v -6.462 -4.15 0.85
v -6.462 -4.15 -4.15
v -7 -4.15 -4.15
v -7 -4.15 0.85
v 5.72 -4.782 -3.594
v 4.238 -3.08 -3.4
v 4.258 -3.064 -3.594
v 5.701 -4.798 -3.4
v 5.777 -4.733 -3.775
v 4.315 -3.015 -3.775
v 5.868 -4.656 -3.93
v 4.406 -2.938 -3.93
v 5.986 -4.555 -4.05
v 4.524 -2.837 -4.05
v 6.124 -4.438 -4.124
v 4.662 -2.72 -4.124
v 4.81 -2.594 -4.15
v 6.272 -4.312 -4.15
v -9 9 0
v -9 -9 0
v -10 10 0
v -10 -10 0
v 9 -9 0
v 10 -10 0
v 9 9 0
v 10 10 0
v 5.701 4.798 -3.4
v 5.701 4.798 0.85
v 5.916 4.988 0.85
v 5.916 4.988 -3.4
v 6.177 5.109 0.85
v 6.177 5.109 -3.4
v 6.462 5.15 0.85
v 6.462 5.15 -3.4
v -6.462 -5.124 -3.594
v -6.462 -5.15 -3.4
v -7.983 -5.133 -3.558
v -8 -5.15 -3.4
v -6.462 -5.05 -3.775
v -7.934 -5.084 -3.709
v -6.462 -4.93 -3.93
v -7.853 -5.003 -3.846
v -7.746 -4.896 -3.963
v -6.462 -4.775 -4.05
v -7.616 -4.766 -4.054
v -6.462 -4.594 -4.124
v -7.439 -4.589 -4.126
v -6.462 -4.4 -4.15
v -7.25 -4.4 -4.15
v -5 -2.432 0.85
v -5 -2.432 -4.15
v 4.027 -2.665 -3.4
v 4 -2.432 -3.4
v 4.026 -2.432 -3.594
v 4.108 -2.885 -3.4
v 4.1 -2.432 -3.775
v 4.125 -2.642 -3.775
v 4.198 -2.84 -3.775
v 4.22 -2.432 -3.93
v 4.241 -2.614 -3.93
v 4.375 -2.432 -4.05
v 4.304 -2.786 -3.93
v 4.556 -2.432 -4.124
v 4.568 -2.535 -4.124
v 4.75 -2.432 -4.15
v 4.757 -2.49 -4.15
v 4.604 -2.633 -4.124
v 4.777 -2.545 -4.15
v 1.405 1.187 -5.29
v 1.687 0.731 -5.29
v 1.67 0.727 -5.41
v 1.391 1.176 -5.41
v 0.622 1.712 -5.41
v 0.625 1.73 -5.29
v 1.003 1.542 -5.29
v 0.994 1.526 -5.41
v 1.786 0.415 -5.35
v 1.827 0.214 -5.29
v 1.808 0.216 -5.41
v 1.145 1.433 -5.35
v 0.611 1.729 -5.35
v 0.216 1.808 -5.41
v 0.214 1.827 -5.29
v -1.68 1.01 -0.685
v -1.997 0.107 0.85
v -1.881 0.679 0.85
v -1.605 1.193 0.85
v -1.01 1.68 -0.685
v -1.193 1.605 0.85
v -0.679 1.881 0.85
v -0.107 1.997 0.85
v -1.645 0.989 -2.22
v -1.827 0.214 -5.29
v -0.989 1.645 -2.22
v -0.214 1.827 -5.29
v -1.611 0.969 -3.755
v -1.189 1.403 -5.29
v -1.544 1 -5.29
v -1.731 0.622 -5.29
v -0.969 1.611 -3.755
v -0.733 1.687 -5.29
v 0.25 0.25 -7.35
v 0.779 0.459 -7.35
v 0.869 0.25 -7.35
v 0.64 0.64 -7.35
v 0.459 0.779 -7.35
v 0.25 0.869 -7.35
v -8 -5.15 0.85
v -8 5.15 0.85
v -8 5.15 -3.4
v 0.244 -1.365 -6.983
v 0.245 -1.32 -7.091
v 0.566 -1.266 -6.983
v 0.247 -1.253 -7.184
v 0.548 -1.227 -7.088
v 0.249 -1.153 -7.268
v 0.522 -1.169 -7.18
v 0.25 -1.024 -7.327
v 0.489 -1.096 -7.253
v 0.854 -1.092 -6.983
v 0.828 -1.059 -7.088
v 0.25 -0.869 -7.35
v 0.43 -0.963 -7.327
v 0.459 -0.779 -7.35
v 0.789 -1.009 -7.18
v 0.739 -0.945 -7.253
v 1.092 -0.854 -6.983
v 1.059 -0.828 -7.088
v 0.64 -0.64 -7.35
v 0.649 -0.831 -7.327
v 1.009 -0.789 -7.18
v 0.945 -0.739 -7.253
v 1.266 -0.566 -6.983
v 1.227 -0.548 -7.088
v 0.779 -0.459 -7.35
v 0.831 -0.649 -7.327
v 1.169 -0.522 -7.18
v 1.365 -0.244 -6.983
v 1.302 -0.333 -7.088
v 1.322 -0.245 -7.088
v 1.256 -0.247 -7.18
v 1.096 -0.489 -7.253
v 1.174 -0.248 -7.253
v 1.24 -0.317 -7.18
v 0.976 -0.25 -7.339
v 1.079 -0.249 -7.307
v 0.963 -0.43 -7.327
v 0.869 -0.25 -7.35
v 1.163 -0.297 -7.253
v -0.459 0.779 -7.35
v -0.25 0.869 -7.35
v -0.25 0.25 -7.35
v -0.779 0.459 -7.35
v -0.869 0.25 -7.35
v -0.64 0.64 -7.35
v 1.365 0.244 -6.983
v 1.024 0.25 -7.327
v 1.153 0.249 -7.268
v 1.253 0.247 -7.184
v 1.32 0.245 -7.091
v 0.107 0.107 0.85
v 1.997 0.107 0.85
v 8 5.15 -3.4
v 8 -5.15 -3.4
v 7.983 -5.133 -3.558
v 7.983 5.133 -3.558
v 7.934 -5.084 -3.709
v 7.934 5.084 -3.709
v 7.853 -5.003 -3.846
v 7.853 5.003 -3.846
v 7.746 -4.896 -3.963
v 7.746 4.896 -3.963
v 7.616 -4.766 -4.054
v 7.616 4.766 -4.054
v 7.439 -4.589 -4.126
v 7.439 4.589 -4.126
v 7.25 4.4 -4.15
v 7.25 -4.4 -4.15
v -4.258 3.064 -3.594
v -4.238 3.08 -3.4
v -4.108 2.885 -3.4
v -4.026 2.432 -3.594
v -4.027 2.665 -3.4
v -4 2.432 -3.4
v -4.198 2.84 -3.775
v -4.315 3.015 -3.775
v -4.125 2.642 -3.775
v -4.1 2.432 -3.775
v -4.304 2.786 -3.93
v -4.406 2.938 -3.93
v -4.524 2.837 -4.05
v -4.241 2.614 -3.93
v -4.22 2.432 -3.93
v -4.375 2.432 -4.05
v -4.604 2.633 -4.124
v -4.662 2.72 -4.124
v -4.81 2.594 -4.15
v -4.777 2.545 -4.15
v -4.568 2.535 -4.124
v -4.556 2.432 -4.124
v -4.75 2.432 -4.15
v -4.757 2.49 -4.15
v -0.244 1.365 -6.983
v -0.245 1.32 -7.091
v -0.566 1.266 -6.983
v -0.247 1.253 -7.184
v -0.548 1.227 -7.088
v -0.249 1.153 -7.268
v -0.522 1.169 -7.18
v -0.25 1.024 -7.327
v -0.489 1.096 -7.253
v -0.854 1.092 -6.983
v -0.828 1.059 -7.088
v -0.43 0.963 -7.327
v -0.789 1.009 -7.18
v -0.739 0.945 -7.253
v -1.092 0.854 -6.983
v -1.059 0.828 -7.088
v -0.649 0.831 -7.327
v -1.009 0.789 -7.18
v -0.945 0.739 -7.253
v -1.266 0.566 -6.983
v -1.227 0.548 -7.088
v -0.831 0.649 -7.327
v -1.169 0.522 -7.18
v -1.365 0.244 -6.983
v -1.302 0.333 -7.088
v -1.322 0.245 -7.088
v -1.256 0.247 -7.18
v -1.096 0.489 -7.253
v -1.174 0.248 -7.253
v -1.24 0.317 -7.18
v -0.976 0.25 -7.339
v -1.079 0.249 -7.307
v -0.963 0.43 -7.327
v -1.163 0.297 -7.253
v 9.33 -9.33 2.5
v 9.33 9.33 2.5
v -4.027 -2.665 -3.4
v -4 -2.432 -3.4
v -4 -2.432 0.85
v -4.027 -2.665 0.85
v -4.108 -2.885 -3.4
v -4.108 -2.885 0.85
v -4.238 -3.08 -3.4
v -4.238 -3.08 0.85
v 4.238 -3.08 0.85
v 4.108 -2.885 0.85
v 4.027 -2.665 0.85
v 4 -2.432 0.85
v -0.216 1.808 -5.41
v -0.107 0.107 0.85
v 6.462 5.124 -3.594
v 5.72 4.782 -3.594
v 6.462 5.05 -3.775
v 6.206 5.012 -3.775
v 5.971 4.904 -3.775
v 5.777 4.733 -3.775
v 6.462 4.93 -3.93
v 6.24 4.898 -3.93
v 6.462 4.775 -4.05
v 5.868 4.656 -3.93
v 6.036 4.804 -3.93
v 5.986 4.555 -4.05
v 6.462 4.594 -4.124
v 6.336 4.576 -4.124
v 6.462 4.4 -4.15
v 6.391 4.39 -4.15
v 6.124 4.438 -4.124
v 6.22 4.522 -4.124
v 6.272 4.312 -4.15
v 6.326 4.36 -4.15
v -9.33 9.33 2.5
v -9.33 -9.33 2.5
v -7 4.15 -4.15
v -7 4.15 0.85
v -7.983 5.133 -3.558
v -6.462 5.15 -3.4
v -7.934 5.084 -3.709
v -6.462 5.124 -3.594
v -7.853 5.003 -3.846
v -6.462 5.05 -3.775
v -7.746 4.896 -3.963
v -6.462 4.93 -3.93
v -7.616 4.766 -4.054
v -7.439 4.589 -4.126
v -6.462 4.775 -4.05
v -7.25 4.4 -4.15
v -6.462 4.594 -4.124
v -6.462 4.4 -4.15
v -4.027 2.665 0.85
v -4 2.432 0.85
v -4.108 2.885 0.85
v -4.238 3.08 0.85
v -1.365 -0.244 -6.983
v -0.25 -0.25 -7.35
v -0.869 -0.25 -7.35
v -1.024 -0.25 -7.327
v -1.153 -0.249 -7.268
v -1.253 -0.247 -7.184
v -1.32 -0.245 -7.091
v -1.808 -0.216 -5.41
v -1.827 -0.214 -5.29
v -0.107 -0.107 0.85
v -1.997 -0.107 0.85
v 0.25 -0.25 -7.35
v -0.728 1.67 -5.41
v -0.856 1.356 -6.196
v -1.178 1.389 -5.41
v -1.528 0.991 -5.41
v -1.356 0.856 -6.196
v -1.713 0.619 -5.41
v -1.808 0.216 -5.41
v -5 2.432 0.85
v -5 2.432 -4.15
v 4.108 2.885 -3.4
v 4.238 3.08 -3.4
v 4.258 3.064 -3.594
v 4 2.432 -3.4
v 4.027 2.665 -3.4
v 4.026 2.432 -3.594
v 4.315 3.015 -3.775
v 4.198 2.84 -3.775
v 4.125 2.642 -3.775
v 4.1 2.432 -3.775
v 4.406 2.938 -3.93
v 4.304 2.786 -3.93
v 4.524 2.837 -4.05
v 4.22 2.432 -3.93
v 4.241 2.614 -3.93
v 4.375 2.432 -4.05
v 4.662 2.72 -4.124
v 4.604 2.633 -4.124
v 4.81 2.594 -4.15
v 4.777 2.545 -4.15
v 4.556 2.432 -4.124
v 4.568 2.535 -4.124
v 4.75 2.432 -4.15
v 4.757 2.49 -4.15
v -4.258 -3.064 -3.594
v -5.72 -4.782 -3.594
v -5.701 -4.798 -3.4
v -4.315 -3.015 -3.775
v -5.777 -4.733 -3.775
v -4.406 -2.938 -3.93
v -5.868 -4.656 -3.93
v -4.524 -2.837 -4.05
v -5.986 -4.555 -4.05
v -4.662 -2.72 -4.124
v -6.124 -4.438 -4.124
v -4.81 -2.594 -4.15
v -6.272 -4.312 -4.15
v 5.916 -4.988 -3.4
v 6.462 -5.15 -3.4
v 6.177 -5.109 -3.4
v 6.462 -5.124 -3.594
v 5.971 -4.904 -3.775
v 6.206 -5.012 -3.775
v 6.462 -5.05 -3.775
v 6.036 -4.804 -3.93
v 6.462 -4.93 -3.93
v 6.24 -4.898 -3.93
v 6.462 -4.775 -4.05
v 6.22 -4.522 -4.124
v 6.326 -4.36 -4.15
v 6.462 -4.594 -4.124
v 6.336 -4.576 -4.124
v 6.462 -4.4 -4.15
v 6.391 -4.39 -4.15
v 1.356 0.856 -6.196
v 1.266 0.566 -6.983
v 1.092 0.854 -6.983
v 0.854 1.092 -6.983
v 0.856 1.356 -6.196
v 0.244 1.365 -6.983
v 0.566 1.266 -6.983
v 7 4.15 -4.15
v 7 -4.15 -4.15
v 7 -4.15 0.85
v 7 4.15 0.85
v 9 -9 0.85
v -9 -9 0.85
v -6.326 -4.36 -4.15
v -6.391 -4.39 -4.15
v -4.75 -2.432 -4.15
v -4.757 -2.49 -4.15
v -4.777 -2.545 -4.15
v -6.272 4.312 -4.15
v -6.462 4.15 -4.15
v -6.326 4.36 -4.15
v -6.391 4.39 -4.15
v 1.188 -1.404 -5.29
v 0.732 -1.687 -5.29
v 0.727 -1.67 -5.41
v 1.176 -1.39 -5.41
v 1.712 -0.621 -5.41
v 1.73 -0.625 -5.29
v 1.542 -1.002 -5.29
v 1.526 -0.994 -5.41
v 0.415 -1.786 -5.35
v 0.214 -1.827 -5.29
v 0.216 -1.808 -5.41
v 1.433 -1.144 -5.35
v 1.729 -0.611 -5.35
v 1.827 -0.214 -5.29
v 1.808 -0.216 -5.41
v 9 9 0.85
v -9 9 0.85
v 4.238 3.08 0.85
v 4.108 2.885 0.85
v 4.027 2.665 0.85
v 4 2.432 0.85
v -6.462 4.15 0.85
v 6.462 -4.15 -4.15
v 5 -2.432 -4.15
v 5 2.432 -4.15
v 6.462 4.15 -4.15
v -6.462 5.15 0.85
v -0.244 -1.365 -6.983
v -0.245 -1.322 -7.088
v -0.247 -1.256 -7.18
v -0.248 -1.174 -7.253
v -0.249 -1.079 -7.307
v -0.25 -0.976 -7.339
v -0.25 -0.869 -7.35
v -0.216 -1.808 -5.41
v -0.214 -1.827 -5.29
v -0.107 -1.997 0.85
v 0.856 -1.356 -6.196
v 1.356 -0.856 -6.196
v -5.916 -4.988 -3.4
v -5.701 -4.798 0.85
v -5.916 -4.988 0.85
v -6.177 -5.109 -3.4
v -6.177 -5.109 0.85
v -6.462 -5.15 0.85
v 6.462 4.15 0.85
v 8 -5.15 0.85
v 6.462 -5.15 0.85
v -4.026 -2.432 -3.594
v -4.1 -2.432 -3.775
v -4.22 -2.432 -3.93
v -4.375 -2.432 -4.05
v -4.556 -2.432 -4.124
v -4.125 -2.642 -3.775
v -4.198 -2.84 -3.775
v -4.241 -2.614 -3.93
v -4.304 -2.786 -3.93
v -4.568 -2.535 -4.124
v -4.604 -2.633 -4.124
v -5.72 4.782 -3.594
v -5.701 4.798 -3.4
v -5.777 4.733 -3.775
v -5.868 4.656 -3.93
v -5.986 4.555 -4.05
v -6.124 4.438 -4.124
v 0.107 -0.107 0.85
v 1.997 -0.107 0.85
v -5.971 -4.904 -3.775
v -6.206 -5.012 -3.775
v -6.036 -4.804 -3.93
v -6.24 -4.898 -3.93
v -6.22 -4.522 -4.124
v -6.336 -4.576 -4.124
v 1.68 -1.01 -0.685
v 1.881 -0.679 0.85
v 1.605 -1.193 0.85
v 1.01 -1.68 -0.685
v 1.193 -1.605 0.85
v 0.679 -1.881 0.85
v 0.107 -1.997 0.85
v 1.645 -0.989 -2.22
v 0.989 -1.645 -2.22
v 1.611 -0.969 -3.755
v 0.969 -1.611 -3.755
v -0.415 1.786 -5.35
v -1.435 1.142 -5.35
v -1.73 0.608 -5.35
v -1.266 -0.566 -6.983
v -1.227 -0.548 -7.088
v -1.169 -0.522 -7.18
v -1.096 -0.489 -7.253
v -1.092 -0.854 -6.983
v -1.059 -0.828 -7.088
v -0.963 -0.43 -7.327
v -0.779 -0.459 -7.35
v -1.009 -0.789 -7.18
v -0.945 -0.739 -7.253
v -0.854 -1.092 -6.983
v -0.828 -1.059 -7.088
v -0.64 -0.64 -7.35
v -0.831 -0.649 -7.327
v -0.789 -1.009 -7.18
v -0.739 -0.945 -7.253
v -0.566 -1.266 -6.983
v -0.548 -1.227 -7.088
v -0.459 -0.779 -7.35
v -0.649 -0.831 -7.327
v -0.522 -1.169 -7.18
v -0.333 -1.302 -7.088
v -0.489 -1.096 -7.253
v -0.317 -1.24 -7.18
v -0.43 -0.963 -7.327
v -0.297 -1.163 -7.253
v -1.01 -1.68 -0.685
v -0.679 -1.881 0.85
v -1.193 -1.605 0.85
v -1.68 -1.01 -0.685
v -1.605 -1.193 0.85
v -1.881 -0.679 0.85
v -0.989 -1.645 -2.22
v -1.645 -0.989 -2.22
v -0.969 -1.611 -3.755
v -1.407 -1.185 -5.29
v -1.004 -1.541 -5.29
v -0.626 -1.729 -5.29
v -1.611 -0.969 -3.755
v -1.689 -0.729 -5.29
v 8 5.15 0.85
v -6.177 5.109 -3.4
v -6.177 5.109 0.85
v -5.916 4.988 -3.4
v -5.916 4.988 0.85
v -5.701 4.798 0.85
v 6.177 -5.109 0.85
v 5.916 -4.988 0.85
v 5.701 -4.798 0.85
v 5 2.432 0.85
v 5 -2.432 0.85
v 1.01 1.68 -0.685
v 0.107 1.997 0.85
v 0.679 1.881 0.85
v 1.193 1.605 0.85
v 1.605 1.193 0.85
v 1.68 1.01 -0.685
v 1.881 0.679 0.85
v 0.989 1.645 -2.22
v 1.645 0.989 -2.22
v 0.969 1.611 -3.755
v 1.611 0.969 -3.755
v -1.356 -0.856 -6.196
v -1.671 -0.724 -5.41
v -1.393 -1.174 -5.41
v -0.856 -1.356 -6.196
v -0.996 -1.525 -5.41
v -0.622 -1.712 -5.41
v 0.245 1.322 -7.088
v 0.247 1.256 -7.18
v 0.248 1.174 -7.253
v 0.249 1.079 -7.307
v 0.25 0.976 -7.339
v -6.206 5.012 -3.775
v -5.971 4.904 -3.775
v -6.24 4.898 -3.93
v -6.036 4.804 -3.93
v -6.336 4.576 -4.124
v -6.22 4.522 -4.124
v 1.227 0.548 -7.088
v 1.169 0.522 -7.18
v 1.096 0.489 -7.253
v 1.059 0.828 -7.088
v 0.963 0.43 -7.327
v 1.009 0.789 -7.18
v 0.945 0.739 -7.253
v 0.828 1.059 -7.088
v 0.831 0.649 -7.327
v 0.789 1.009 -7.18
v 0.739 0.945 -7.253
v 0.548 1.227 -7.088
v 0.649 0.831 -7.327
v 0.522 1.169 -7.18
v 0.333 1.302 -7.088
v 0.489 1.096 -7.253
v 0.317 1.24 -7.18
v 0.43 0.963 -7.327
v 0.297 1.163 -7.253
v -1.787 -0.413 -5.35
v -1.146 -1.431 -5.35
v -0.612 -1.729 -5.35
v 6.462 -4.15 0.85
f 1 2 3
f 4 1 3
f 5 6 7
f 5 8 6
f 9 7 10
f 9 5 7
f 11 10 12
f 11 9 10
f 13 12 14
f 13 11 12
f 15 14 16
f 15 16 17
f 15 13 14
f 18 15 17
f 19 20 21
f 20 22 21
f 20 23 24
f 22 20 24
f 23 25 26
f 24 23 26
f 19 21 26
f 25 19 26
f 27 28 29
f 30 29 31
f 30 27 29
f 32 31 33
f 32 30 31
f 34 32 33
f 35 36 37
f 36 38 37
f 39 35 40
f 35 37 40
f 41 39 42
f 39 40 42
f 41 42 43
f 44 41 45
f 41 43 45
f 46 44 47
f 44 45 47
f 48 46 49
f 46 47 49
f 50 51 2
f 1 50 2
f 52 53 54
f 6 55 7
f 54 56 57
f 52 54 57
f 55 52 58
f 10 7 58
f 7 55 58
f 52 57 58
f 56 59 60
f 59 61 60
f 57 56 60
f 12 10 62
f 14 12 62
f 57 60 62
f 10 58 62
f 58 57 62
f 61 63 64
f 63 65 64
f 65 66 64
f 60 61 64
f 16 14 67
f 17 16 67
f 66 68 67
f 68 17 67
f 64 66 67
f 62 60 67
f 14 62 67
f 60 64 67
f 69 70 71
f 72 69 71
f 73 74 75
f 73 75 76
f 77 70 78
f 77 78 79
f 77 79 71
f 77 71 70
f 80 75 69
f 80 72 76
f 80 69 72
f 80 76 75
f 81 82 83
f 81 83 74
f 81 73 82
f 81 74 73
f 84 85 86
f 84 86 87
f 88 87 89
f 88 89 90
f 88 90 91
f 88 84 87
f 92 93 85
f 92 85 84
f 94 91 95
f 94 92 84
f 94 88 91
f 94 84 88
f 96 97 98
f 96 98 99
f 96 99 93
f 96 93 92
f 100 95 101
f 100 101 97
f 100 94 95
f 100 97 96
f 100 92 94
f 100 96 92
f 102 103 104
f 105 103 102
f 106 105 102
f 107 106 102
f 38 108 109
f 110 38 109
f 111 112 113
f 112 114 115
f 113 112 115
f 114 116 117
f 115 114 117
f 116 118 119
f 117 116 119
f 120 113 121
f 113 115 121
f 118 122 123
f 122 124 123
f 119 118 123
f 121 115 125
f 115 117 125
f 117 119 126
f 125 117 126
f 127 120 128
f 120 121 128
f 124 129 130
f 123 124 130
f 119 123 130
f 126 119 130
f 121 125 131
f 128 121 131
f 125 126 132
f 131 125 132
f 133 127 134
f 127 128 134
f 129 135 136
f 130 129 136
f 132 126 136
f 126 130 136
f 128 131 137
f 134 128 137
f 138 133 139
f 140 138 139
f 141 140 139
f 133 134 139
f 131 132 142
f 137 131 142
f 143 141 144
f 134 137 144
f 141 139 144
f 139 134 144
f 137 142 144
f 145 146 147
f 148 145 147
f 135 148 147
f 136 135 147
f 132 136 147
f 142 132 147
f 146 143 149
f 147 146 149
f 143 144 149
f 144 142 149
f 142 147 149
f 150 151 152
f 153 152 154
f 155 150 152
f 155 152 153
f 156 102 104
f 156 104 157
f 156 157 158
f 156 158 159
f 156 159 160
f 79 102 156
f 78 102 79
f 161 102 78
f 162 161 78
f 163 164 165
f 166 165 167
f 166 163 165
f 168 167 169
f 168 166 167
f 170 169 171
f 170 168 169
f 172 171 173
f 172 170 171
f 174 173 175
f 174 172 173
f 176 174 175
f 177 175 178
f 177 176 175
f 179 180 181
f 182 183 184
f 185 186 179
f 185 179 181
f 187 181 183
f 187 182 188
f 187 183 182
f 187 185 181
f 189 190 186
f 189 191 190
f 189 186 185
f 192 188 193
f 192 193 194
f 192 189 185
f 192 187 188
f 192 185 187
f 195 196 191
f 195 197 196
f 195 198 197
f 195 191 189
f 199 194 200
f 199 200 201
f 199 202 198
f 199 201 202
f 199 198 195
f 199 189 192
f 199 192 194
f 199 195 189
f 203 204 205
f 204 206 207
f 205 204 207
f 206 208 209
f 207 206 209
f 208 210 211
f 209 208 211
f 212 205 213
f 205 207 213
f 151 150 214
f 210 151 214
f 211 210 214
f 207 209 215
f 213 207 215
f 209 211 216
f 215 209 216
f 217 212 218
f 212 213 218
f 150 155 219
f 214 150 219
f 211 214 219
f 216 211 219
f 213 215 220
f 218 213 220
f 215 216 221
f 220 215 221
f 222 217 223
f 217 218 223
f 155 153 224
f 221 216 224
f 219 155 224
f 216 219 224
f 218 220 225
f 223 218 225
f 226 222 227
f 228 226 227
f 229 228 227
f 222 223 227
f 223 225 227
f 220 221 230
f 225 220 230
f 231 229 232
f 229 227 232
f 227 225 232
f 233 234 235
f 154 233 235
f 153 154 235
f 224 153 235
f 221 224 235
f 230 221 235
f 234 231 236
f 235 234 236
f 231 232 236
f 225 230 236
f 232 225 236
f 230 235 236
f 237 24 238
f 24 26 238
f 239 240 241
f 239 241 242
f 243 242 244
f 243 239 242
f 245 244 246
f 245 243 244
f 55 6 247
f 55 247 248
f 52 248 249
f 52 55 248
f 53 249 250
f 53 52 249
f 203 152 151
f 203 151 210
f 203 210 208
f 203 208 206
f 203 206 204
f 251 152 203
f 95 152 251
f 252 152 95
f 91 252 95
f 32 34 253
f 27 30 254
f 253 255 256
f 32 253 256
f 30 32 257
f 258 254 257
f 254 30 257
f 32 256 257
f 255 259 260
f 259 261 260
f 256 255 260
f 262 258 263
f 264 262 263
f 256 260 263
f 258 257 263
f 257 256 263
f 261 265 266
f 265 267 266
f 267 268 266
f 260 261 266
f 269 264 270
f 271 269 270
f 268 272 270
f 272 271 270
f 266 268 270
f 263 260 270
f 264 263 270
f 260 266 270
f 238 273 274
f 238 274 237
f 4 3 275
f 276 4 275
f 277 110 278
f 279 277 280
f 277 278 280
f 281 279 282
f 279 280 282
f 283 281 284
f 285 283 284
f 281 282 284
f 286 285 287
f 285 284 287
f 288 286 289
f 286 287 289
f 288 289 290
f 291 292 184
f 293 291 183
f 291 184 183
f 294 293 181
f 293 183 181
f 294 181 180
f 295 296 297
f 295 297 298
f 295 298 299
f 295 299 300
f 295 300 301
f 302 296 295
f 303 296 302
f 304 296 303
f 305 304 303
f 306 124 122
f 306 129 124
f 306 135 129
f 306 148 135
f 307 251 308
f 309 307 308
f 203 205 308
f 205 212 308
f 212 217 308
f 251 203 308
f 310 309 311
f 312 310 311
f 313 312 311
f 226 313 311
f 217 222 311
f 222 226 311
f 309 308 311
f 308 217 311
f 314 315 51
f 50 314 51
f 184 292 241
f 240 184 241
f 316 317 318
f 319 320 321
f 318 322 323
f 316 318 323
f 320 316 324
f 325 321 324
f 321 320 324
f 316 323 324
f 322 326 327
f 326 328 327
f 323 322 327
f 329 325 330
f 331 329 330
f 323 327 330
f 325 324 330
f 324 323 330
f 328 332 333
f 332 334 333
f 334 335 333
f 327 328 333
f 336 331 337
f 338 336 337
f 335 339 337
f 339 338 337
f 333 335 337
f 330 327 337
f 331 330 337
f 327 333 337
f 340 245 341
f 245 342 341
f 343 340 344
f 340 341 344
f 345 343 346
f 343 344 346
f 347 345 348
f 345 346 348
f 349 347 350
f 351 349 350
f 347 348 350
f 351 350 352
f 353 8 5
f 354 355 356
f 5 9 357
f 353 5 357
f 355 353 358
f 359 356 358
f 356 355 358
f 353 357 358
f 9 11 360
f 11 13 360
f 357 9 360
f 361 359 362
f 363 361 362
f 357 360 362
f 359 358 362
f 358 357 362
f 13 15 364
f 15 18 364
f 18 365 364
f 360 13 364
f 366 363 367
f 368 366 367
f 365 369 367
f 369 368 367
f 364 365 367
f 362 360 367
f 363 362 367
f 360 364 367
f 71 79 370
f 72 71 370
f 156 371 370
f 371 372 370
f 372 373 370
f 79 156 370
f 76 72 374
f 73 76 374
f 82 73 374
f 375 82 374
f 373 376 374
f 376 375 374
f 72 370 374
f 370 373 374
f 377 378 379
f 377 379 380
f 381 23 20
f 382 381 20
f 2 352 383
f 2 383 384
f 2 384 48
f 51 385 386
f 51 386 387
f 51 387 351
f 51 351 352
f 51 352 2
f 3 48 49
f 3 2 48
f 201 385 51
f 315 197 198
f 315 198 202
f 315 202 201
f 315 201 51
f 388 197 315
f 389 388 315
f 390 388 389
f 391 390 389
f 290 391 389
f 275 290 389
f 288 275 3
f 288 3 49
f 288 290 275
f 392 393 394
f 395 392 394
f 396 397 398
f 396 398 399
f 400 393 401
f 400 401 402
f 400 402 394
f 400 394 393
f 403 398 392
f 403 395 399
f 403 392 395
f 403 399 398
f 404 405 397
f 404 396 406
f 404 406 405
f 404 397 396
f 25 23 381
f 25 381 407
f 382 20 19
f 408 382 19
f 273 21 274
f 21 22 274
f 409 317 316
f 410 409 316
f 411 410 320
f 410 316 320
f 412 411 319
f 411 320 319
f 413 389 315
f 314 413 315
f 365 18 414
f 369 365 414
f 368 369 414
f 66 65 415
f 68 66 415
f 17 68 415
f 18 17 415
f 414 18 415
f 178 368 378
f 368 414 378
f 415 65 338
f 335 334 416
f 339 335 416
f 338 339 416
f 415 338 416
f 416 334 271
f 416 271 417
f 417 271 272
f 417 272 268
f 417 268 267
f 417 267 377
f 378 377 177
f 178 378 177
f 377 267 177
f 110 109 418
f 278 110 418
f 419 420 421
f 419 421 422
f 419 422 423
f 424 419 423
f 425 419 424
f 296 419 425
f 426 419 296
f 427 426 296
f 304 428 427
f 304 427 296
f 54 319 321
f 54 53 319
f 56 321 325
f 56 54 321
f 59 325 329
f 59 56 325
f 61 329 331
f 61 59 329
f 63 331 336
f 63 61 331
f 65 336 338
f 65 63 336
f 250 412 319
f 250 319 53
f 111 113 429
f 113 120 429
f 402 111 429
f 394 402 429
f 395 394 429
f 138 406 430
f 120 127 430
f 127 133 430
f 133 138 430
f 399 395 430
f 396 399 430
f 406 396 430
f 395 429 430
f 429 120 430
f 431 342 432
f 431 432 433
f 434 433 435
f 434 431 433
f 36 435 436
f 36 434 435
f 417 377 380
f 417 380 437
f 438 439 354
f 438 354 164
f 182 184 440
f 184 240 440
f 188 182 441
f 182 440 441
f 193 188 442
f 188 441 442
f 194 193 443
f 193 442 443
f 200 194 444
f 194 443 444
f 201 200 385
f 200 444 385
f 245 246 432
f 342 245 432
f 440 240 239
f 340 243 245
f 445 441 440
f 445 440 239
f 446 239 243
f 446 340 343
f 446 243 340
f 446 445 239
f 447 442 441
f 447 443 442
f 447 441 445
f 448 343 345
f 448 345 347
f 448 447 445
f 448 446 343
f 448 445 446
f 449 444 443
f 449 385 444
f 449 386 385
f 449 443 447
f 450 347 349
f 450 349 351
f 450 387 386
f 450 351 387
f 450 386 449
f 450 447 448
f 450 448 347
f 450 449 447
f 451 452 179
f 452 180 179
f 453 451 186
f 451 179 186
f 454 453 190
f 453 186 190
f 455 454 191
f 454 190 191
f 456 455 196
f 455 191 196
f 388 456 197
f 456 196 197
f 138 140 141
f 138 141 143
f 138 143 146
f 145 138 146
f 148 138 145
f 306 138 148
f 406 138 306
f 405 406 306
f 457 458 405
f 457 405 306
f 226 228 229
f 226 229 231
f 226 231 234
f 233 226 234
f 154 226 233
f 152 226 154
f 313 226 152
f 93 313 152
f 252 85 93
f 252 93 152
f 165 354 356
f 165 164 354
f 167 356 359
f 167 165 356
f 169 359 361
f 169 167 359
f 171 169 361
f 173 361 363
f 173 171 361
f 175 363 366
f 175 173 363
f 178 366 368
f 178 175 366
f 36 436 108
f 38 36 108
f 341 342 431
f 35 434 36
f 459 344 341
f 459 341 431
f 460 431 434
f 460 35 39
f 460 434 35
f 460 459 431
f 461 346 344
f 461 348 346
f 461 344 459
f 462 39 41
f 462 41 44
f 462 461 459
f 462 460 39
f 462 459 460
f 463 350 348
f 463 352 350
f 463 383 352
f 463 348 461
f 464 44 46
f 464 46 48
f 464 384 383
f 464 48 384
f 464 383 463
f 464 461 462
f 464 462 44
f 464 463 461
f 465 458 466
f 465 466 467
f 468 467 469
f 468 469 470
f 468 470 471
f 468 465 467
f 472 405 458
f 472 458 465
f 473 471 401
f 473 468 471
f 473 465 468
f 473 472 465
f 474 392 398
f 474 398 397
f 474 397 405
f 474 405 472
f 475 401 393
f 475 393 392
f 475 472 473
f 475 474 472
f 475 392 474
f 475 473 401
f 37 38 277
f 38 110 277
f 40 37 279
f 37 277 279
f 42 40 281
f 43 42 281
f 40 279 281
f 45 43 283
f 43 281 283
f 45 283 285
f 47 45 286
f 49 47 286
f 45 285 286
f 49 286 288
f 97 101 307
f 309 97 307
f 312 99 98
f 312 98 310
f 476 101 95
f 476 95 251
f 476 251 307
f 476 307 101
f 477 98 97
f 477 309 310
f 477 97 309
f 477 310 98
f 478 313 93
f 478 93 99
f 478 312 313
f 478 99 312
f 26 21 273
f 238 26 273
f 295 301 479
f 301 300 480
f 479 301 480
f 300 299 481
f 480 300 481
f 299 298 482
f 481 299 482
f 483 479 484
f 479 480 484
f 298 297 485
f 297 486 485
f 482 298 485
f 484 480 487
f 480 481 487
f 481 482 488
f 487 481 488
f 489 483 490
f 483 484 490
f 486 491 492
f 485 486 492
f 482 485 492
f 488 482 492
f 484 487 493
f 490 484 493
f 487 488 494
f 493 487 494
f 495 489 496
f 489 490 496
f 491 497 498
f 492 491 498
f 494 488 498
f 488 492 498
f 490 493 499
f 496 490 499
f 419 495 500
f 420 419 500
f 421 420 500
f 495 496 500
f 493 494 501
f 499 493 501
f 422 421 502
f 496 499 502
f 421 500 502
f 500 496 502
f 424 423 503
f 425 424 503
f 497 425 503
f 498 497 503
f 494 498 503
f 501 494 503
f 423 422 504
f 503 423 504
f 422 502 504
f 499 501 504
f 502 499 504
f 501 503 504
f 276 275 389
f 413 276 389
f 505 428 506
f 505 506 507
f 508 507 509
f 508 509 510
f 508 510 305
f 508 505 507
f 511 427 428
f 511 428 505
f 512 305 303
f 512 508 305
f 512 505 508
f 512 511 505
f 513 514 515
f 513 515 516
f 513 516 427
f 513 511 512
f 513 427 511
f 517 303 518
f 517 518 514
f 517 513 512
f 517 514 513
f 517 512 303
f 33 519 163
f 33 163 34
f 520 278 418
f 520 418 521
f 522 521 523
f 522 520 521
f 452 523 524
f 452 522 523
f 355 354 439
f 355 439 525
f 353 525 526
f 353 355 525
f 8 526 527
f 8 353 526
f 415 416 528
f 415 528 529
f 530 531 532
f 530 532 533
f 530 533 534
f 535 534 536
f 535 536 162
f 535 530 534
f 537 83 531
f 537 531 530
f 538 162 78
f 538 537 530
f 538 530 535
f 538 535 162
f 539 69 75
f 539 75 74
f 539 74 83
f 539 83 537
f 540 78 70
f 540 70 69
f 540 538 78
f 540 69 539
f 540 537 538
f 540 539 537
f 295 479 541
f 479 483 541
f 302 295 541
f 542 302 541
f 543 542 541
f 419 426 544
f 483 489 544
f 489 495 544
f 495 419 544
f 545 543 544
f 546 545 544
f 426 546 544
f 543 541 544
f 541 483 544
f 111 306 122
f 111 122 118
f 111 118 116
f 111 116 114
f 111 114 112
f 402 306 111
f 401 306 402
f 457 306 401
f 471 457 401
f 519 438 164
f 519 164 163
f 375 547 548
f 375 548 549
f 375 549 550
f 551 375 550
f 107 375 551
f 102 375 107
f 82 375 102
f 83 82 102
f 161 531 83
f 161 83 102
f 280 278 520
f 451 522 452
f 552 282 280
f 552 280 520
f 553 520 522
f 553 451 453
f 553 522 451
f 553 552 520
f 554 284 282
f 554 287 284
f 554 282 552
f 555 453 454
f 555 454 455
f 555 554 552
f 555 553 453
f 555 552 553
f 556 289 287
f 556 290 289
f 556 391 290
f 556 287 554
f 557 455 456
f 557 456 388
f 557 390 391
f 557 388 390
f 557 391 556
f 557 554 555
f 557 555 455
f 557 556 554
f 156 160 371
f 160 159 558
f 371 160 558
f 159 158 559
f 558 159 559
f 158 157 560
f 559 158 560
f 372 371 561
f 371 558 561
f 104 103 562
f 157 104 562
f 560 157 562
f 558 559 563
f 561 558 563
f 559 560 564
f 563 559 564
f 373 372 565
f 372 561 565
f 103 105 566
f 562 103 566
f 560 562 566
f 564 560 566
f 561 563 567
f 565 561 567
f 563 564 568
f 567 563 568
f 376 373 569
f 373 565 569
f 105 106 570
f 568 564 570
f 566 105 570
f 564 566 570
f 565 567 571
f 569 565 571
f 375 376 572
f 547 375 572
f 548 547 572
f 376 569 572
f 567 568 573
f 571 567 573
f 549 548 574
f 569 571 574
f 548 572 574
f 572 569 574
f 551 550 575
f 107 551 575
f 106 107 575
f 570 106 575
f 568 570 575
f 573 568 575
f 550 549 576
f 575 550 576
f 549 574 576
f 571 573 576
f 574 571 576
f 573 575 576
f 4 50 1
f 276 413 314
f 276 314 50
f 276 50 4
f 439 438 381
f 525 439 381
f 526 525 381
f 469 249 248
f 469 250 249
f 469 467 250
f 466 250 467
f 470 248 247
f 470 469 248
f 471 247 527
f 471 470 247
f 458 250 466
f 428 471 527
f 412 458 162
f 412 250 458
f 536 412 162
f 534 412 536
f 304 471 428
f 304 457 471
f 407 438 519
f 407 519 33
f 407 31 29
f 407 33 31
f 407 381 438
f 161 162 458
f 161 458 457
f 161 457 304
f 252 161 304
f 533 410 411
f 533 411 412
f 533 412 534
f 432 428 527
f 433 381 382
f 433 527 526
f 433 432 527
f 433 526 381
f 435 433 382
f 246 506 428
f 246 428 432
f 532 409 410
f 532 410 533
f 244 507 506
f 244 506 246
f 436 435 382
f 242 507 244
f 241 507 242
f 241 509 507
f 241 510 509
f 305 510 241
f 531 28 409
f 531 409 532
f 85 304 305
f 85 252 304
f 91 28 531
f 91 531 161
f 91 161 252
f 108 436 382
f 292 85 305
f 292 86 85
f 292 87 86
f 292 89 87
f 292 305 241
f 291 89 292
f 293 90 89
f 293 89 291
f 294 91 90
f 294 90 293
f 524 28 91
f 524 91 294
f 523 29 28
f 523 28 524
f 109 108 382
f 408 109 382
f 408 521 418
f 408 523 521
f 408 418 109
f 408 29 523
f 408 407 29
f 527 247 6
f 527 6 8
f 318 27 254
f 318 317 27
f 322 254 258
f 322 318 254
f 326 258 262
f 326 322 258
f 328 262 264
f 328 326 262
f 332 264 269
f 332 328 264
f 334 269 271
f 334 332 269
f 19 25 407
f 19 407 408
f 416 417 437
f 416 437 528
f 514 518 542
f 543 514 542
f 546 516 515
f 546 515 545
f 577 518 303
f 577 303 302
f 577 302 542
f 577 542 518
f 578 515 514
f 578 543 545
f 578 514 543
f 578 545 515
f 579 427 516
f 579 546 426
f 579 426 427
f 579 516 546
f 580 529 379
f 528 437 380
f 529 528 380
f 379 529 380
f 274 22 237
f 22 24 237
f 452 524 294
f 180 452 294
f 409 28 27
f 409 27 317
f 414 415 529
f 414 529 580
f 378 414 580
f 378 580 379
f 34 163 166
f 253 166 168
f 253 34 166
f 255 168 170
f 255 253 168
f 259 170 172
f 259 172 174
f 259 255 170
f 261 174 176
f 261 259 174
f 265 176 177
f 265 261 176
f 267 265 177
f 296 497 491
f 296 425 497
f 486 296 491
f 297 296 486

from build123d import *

# Parameters (mm, degrees)
SKETCH1_W               = 20
SKETCH1_H               = 20
BOSS_EXTRUDE1_DEPTH     = 2.5
BOSS_EXTRUDE1_TAPER     = 15
SKETCH2_W               = 18
SKETCH2_H               = 18
CUT_EXTRUDE1_DEPTH      = 0.85
SKETCH3_R               = 2
BOSS_EXTRUDE2_DEPTH     = 8.2
BOSS_EXTRUDE2_TAPER     = 1.5
CHAMFER1_SIZE           = 2
CHAMFER1_SIZE_2         = 0.5
FILLET1_R               = 0.5
SKETCH4_W               = 0.5
SKETCH4_H               = 6.160058372
SKETCH4_W_2             = 6.292216955
SKETCH4_H_2             = 0.5
CUT_EXTRUDE_THIN1_DEPTH = 8.2
CUT_EXTRUDE_THIN1_TAPER = 1
BOSS_EXTRUDE3_DEPTH     = 5
FILLET2_R               = 1
FILLET3_R               = 0.75
CUT_EXTRUDE2_DEPTH      = 5
FILLET2_OF_MIRROR1_R    = 1
FILLET3_OF_MIRROR1_R    = 0.75


with BuildPart() as part:
    # Sketch1 → Boss-Extrude1 (new body)
    with BuildSketch(Plane.XY):
        Rectangle(SKETCH1_W, SKETCH1_H)
    extrude(amount=BOSS_EXTRUDE1_DEPTH, taper=BOSS_EXTRUDE1_TAPER)

    # Sketch2 → Cut-Extrude1 (cut)
    with BuildSketch(Plane(origin=(0, 0, 0), x_dir=(-1, 0, 0), z_dir=(0, 0, -1))):
        Rectangle(SKETCH2_W, SKETCH2_H)
    extrude(amount=-CUT_EXTRUDE1_DEPTH, mode=Mode.SUBTRACT)

    # Sketch3 → Boss-Extrude2 (add)
    with BuildSketch(Plane(origin=(0, 0, 0.85), x_dir=(-1, 0, 0), z_dir=(0, 0, -1))):
        Circle(SKETCH3_R)
    extrude(amount=BOSS_EXTRUDE2_DEPTH, taper=BOSS_EXTRUDE2_TAPER)

    # Chamfer1
    # the kernel refuses this chamfer: 2, 0.5 mm, written as the material it takes off along each edge
    with BuildSketch(Plane(origin=(0, 0, -7.35), x_dir=(-1, 0, 0), z_dir=(0, 1, 0))) as chamfer1_piece_1:
        Polygon((1.785275443 + CHAMFER1_SIZE * 0.0261769483079, CHAMFER1_SIZE * 0.999657324976), (1.785275443 - CHAMFER1_SIZE_2, 0), (1.785275443, 0), align=None)
    revolve(axis=Axis((0, 0, -7.35), (0, 0, 1)), mode=Mode.SUBTRACT)

    # Fillet1
    fillet1_edges = [part.edges().sort_by_distance(p)[0] for p in [
        (1.285275443, 0, -7.35),
        (1.83762934, 0, -5.35068535),
    ]]
    fillet(fillet1_edges, radius=FILLET1_R)

    # Sketch4 → Cut-Extrude-Thin1 (cut)
    with BuildSketch(Plane(origin=(0, 0, -7.35), x_dir=(-1, 0, 0), z_dir=(0, 0, -1))):
        with Locations((0, 0.055971591)):
            Rectangle(SKETCH4_W, SKETCH4_H)
        with Locations((0.111262179, 0)):
            Rectangle(SKETCH4_W_2, SKETCH4_H_2)
    extrude(amount=-CUT_EXTRUDE_THIN1_DEPTH, taper=CUT_EXTRUDE_THIN1_TAPER, mode=Mode.SUBTRACT)

    # Sketch5 → Boss-Extrude3 (add)
    with BuildSketch(Plane(origin=(0, 0, 0.85), x_dir=(-1, 0, 0), z_dir=(0, 0, -1))):
        Polygon((4, 2.8), (4, -2.8), (6, -5.15), (8, -5.15), (8, 5.15), (6, 5.15), align=None)
    boss_extrude3 = extrude(amount=BOSS_EXTRUDE3_DEPTH)

    # Fillet2
    fillet2_edges = [part.edges().sort_by_distance(p)[0] for p in [
        (-6, -5.15, -1.65),
        (-6, 5.15, -1.65),
        (-4, 2.8, -1.65),
        (-4, -2.8, -1.65),
    ]]
    fillet(fillet2_edges, radius=FILLET2_R)

    # Fillet3
    fillet3_edges = [part.edges().sort_by_distance(p)[0] for p in [
        (-8, 0, -4.15),
        (-7.231032941, 5.15, -4.15),
        (-4.969493552, 3.939154923, -4.15),
        (-7.231032941, -5.15, -4.15),
        (-4, 0, -4.15),
        (-4.969493552, -3.939154923, -4.15),
        (-4.061506689, -2.777370003, -4.15),
        (-6.042613043, -5.057777128, -4.15),
        (-4.061506689, 2.777370003, -4.15),
        (-6.042613043, 5.057777128, -4.15),
    ]]
    fillet(fillet3_edges, radius=FILLET3_R)

    # Sketch6 → Cut-Extrude2 (cut)
    with BuildSketch(Plane(origin=(0, 0, -4.15), x_dir=(-1, 0, 0), z_dir=(0, 0, -1))):
        Polygon((7, -4.15), (7, 4.15), (6.462065883, 4.15), (5, 2.432072588), (5, -2.432072588), (6.462065883, -4.15), align=None)
    cut_extrude2 = extrude(amount=-CUT_EXTRUDE2_DEPTH, mode=Mode.SUBTRACT)

    # Mirror1: Boss-Extrude3, Cut-Extrude2 across plane
    add(boss_extrude3.mirror(Plane(origin=(0, 0, 0), x_dir=(0, 0, 1), z_dir=(1, 0, 0))))
    add(cut_extrude2.mirror(Plane(origin=(0, 0, 0), x_dir=(0, 0, 1), z_dir=(1, 0, 0))), mode=Mode.SUBTRACT)

    # Fillet2 of Mirror1
    fillet2_of_mirror1_edges = [part.edges().sort_by_distance(p)[0] for p in [
        (6, -5.15, -1.65),
        (6, 5.15, -1.65),
        (4, 2.8, -1.65),
        (4, -2.8, -1.65),
    ]]
    fillet(fillet2_of_mirror1_edges, radius=FILLET2_OF_MIRROR1_R)

    # Fillet3 of Mirror1
    fillet3_of_mirror1_edges = [part.edges().sort_by_distance(p)[0] for p in [
        (8, 0, -4.15),
        (7.231032941, 5.15, -4.15),
        (4.969493552, 3.939154923, -4.15),
        (7.231032941, -5.15, -4.15),
        (4, 0, -4.15),
        (4.969493552, -3.939154923, -4.15),
        (4.061506689, -2.777370003, -4.15),
        (6.042613043, -5.057777128, -4.15),
        (4.061506689, 2.777370003, -4.15),
        (6.042613043, 5.057777128, -4.15),
    ]]
    fillet(fillet3_of_mirror1_edges, radius=FILLET3_OF_MIRROR1_R)


solid = part.part
